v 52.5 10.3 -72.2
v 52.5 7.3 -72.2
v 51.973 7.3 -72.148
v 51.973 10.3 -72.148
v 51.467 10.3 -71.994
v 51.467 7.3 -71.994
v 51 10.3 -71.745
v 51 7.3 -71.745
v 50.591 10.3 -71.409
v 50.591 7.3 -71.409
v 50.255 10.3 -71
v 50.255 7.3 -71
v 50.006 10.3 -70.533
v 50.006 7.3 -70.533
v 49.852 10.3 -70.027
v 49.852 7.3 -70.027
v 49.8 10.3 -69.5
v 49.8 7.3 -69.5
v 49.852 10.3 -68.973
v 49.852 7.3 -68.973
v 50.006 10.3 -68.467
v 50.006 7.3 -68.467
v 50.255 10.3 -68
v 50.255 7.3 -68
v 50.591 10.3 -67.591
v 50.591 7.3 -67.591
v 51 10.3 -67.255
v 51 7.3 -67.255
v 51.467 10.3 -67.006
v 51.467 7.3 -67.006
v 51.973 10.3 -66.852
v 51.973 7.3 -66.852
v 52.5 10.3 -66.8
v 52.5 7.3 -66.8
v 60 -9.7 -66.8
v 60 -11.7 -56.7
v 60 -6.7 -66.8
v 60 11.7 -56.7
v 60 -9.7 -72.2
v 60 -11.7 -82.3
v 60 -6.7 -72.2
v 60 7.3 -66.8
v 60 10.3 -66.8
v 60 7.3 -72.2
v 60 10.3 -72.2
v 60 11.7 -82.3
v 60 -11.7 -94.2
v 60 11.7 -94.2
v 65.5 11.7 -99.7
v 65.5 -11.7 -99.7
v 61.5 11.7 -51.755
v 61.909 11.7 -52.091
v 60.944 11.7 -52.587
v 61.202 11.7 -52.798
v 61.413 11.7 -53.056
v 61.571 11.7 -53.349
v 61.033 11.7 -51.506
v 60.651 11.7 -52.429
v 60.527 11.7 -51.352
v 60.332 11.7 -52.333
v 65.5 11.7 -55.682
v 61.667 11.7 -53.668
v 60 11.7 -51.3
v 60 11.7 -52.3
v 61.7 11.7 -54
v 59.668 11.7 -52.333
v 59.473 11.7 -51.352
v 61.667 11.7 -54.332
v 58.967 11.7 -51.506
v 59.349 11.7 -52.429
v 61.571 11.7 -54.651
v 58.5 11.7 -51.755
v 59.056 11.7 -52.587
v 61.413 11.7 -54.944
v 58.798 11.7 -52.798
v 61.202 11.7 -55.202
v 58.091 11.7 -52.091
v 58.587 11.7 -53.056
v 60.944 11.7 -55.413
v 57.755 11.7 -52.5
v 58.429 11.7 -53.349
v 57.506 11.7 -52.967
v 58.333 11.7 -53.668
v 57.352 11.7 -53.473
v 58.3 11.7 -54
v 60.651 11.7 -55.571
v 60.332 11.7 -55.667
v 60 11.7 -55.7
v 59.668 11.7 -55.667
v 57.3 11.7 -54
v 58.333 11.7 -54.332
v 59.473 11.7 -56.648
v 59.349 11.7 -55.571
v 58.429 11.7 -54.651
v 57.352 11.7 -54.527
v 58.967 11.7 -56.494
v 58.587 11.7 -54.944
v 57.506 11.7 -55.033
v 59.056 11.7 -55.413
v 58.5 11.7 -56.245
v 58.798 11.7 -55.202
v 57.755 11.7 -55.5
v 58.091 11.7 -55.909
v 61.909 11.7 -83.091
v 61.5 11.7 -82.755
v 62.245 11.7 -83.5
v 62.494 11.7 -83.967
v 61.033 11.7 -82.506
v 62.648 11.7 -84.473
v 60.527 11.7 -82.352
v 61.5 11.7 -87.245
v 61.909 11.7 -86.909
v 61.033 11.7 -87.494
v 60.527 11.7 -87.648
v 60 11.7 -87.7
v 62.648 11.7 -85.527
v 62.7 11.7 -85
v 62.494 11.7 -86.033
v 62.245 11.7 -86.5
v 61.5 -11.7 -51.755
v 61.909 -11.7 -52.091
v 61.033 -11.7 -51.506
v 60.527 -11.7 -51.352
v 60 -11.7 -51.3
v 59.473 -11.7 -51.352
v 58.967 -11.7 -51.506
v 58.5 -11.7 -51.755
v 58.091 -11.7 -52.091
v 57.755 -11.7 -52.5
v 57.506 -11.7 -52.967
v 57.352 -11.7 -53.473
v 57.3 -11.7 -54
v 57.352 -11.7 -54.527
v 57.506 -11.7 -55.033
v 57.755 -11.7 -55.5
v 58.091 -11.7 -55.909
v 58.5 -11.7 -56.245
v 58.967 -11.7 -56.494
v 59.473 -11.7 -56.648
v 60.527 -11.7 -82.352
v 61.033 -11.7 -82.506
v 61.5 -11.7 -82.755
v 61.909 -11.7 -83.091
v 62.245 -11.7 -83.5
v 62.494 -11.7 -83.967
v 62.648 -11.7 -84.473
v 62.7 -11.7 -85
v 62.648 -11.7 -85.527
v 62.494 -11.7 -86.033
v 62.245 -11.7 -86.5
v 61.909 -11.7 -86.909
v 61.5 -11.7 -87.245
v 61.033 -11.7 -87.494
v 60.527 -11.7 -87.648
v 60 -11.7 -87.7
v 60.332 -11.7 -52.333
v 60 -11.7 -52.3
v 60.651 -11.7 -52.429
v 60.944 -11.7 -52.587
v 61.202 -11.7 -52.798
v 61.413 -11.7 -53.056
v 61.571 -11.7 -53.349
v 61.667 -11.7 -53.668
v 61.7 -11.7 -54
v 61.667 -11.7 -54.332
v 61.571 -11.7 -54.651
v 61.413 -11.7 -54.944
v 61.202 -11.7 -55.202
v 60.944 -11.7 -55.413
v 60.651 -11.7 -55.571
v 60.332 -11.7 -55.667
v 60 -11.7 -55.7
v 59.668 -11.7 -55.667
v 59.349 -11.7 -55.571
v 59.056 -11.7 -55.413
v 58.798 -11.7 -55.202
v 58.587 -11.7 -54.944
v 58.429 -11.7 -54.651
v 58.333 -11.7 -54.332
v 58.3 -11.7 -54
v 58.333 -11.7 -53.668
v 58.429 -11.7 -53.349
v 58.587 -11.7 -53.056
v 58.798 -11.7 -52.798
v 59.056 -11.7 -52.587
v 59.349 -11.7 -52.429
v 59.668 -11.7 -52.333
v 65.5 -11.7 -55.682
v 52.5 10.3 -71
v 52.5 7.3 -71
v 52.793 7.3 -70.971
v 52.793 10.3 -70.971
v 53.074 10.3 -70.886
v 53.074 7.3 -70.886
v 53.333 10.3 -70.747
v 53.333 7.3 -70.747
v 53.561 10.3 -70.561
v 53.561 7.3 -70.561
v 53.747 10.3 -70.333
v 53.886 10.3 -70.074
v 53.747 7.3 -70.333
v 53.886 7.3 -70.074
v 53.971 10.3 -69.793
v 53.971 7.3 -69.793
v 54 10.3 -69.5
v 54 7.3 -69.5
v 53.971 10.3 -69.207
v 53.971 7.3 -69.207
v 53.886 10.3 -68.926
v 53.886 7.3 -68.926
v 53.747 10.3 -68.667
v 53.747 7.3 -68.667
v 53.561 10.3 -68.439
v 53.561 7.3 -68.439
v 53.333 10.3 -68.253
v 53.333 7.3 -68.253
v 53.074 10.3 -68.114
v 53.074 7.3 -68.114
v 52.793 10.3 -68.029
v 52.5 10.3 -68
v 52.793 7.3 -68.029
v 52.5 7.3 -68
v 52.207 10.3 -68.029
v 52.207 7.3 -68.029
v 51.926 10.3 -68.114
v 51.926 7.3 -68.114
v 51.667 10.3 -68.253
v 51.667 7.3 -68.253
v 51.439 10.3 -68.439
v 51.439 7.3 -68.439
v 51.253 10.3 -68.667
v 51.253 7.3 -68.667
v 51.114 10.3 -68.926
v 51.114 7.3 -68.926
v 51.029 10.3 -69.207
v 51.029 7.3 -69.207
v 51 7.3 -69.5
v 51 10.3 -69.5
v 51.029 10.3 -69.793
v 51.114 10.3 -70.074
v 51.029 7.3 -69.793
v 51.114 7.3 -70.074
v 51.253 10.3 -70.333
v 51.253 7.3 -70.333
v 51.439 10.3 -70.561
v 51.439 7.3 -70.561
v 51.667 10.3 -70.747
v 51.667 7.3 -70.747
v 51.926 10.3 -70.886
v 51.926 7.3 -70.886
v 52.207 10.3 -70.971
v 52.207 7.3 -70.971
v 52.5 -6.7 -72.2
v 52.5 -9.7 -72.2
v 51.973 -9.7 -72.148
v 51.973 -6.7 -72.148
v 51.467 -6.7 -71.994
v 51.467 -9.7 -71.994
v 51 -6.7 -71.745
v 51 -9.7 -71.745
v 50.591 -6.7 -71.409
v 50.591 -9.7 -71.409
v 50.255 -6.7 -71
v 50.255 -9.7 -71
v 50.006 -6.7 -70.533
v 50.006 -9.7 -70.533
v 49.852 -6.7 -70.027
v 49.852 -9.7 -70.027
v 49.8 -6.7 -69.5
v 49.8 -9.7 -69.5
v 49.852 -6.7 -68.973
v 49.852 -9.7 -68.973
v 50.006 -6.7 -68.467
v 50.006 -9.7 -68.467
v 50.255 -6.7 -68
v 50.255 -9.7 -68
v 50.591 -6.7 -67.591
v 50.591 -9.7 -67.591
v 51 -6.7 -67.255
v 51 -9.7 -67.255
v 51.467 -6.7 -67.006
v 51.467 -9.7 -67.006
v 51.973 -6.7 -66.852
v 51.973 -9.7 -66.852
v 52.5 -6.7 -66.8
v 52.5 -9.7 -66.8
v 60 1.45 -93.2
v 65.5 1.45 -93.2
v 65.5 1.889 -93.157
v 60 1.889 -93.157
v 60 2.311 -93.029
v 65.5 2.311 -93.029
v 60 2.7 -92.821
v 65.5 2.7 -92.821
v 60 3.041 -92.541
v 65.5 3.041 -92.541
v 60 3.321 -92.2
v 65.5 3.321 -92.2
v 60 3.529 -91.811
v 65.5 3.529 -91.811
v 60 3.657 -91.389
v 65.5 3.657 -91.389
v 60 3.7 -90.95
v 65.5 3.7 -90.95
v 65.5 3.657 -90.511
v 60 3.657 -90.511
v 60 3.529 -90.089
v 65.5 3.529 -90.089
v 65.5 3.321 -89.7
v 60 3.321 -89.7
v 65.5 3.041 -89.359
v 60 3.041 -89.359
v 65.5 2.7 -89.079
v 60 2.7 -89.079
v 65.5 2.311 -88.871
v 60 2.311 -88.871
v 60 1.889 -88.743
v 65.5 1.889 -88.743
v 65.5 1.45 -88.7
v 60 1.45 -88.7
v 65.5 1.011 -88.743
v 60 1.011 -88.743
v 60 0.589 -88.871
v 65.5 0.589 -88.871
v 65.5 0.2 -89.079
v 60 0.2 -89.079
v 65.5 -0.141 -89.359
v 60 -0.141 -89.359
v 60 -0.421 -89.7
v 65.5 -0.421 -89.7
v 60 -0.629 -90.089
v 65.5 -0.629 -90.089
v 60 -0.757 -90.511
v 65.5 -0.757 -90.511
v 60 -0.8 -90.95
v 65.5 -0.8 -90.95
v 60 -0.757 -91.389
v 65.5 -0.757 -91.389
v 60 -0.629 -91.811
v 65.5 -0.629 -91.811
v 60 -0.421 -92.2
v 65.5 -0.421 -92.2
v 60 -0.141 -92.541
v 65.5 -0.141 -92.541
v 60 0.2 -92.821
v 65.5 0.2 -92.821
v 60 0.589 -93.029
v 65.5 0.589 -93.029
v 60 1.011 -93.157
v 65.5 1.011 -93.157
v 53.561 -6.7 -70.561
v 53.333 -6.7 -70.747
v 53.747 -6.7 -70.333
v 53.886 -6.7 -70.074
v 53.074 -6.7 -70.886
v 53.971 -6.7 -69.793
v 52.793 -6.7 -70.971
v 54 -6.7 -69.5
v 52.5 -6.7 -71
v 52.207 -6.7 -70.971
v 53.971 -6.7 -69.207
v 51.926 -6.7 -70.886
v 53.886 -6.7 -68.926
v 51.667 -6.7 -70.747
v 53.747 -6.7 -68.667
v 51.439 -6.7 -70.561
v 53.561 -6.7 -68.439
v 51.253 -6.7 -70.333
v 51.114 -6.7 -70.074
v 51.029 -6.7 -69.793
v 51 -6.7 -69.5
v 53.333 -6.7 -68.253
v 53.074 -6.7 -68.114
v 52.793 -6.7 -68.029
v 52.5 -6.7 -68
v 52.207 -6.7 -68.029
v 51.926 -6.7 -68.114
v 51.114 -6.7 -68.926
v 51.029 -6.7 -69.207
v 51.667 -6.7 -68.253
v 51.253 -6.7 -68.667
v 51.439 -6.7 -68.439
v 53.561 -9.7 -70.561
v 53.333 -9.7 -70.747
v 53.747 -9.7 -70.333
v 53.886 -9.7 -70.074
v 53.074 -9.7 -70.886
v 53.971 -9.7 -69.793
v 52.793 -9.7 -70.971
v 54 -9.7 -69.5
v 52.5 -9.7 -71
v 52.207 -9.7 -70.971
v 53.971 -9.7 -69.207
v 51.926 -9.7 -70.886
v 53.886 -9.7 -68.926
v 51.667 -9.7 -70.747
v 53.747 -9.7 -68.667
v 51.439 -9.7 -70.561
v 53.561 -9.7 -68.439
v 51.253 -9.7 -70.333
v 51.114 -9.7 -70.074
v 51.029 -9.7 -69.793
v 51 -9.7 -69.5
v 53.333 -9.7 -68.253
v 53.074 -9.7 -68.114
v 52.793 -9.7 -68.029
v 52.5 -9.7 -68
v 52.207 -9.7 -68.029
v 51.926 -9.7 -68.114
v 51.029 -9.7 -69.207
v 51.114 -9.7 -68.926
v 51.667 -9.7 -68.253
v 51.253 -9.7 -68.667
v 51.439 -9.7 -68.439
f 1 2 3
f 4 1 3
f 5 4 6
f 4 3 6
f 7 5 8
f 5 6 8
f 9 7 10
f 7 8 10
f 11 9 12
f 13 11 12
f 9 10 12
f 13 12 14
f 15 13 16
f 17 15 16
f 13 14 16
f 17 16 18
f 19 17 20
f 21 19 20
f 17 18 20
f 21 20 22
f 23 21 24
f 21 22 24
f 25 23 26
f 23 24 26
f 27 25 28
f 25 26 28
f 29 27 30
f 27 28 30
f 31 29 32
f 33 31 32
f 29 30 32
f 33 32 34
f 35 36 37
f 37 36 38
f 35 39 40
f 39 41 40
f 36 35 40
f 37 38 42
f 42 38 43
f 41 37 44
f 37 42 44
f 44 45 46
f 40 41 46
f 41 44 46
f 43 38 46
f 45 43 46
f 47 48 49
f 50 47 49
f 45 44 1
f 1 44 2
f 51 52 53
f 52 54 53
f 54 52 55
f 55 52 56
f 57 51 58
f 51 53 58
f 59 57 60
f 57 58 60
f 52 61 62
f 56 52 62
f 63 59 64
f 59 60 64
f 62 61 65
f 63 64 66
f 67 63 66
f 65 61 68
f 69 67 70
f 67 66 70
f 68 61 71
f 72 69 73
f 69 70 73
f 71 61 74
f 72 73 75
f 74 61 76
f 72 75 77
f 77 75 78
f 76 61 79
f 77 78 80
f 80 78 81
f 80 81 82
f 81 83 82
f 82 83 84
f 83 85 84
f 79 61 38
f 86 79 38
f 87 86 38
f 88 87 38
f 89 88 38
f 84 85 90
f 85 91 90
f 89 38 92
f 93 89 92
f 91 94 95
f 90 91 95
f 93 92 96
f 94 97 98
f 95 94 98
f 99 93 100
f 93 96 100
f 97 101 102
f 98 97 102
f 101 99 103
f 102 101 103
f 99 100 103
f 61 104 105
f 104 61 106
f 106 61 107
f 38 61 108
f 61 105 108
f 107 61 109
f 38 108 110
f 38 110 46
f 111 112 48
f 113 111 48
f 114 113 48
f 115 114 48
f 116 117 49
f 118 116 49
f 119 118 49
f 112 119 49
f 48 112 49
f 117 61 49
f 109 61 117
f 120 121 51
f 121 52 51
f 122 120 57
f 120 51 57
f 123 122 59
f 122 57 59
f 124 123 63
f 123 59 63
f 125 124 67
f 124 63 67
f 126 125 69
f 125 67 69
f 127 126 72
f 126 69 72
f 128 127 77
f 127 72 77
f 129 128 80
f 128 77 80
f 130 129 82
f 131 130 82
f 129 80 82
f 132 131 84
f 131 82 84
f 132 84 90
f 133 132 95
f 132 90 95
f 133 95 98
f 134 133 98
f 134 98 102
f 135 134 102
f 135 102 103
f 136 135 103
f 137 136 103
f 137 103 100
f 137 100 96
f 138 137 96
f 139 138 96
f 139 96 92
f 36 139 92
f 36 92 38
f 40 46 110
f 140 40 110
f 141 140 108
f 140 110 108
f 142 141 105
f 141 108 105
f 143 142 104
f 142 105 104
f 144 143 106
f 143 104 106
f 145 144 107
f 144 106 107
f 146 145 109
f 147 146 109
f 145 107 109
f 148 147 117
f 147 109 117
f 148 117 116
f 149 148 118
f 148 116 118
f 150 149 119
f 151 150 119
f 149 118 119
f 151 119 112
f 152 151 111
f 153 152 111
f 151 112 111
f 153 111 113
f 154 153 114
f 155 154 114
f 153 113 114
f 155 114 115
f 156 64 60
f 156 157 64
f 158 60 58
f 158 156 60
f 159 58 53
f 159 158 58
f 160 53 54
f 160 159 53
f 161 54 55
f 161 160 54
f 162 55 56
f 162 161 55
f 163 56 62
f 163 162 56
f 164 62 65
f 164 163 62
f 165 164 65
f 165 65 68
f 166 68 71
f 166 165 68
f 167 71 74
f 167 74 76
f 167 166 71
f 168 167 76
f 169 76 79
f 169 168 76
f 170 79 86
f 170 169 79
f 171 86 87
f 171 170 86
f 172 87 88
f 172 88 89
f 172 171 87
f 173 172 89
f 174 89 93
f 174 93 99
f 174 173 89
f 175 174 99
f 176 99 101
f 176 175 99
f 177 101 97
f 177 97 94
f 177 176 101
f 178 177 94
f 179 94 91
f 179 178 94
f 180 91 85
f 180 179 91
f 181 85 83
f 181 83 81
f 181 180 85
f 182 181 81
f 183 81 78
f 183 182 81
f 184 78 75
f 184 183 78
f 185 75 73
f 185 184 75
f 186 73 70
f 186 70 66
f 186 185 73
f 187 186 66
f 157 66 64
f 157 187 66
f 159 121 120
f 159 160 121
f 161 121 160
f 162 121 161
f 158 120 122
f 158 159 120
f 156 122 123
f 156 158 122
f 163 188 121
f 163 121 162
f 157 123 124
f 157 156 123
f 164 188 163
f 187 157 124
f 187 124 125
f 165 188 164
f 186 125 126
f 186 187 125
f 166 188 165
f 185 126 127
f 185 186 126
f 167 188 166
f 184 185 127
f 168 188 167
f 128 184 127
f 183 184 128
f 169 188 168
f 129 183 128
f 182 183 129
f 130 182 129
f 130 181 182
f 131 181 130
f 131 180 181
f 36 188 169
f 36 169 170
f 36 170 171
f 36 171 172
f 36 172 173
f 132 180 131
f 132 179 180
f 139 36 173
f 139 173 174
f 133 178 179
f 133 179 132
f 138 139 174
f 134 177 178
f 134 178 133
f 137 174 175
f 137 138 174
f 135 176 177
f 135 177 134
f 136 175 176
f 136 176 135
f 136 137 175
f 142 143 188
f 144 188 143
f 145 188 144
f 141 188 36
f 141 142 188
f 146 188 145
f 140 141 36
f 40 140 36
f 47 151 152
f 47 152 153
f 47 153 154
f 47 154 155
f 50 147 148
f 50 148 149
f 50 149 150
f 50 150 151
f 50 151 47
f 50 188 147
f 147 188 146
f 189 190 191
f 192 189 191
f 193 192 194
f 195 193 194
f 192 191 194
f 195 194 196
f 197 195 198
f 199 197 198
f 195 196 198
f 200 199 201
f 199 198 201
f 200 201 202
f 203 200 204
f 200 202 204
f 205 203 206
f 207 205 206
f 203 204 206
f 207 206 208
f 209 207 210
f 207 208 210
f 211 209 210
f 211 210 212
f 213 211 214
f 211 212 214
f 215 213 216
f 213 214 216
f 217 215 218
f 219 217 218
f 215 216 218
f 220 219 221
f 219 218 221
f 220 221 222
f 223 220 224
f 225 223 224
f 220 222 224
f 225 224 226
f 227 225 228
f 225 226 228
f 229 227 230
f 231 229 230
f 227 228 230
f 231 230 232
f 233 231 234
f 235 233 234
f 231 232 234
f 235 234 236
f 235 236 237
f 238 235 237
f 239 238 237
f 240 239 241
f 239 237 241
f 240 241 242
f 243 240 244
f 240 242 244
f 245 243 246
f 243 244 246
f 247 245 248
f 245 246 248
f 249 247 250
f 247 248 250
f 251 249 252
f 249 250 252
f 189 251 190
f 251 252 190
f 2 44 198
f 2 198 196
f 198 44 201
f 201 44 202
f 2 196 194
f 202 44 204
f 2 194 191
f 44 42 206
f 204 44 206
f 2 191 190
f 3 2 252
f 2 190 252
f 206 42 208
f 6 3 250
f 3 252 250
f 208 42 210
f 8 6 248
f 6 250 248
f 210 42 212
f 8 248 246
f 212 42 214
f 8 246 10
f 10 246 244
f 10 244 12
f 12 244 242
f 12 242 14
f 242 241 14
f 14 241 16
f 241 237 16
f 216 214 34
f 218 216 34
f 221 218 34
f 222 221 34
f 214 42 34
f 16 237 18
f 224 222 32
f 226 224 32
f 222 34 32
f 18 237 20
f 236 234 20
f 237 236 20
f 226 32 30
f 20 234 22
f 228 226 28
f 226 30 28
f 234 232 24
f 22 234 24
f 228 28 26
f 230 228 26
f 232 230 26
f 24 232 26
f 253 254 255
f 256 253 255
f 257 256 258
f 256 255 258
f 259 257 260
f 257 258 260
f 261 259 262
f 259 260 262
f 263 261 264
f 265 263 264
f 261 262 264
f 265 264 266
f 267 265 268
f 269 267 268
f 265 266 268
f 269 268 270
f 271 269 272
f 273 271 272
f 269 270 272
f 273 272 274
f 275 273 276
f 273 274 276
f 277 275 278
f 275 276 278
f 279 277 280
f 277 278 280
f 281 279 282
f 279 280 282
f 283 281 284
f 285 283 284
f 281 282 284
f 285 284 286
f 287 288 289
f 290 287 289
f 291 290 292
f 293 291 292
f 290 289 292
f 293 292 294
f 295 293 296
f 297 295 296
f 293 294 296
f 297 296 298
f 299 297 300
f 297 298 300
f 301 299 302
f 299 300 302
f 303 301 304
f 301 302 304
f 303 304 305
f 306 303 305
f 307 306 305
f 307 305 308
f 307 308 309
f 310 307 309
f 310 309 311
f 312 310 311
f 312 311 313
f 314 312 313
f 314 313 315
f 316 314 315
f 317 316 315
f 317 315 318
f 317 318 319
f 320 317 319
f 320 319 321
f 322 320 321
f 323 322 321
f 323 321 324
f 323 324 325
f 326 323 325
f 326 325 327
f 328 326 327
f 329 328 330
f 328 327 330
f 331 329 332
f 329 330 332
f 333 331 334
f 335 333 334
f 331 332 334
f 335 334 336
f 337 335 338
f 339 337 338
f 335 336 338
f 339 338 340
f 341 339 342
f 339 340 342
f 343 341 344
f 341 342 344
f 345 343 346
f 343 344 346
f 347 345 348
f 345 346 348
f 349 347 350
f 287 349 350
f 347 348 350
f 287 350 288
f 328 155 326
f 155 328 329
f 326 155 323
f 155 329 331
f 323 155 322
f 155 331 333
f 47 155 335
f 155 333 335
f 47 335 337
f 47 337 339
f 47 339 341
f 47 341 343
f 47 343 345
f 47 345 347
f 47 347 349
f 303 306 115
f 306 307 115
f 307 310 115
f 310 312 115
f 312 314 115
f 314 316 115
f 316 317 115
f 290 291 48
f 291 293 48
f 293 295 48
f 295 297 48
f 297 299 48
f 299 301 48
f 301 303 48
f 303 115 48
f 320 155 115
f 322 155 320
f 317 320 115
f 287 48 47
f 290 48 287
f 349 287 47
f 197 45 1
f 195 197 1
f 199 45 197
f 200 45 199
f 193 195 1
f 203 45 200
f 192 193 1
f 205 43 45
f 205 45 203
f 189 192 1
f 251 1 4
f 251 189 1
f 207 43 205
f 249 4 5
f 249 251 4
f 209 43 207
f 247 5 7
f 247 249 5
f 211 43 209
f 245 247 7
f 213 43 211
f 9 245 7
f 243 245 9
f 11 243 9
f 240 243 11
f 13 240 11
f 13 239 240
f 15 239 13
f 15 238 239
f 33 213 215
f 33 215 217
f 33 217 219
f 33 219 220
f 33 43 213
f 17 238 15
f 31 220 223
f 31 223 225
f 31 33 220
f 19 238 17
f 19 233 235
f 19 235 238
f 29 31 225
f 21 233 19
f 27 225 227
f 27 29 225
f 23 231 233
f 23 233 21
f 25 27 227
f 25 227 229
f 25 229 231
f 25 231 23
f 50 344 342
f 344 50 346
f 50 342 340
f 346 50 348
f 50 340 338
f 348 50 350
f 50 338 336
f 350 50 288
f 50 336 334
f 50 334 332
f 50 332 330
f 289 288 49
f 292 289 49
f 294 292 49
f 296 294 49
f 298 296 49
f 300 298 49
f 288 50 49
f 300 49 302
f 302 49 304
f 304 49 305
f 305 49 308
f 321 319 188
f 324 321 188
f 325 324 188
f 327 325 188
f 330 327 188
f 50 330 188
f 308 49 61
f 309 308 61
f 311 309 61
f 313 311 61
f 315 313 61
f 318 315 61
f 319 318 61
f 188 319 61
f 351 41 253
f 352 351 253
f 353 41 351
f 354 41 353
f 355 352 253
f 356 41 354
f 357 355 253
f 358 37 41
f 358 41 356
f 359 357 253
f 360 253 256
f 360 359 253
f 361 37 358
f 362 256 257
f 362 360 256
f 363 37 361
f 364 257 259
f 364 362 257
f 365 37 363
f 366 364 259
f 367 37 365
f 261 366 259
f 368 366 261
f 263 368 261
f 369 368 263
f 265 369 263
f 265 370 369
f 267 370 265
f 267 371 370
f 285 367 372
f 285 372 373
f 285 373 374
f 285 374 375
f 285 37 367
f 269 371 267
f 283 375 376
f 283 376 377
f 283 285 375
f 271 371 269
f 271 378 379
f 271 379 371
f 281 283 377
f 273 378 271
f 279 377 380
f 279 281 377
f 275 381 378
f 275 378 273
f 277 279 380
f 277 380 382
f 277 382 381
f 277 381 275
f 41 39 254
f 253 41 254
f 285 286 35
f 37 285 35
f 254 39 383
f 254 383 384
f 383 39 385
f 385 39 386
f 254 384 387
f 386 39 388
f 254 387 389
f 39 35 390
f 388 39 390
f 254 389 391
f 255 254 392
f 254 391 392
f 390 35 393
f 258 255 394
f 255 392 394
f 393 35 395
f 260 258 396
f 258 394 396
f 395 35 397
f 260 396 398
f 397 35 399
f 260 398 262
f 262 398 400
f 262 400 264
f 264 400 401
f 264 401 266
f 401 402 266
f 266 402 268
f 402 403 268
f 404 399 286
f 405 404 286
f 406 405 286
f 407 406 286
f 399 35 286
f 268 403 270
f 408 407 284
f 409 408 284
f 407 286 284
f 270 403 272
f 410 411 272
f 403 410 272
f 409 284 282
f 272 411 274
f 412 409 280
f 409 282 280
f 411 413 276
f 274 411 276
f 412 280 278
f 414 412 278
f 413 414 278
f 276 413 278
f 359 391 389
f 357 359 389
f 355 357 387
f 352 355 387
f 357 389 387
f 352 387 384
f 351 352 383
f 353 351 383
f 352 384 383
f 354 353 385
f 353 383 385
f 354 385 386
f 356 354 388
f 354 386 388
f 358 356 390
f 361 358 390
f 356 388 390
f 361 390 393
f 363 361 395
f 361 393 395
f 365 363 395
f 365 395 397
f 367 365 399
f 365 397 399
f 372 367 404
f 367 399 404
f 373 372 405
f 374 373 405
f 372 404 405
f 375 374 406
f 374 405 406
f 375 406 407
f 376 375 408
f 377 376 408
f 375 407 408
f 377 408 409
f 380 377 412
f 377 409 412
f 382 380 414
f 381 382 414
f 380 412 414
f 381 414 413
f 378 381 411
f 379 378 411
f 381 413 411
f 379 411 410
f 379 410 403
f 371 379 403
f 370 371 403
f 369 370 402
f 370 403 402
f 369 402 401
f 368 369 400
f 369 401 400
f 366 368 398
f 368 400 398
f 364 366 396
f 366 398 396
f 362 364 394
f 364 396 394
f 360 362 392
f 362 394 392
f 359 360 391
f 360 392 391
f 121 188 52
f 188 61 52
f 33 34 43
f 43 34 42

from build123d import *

# Parameters (mm, degrees)
SKETCH1_R           = 1.7
BOSS_EXTRUDE1_DEPTH = 11.7
SKETCH2_R           = 2.25
CUT_EXTRUDE1_DEPTH  = 101.718518655
BOSS_EXTRUDE2_START = -2
SKETCH3_R           = 1.5
BOSS_EXTRUDE2_DEPTH = 3
BOSS_EXTRUDE3_START = -19
SKETCH3_2_R         = 1.5
BOSS_EXTRUDE3_DEPTH = 3


with BuildPart() as part:
    # Sketch1 → Boss-Extrude1 (new, symmetric)
    with BuildSketch(Plane(origin=(0, 0, 0), x_dir=(1, 0, 0), z_dir=(0, 1, 0))):
        with BuildLine():
            Line((60, 94.2), (65.5, 99.7))
            Line((65.5, 99.7), (65.5, 55.681623382))
            Line((65.5, 55.681623382), (61.909188309, 52.090811691))
            ThreePointArc((61.909188309, 52.090811691), (57.505525262, 52.966754733), (60, 56.7))
            Line((60, 56.7), (60, 82.3))
            ThreePointArc((60, 82.3), (62.7, 85), (60, 87.7))
            Line((60, 87.7), (60, 88.7))
            Line((60, 88.7), (60, 93.2))
            Line((60, 93.2), (60, 94.2))
        make_face()
        with Locations((60, 54)):
            Circle(SKETCH1_R, mode=Mode.SUBTRACT)
    extrude(amount=BOSS_EXTRUDE1_DEPTH, both=True)

    # Sketch2 → Cut-Extrude1 (cut, through all)
    with BuildSketch(Plane(origin=(65.5, 0, 0), x_dir=(0, 0, -1), z_dir=(1, 0, 0))):
        with Locations((90.95, 1.45)):
            Circle(SKETCH2_R)
    extrude(amount=-CUT_EXTRUDE1_DEPTH, mode=Mode.SUBTRACT)

    # Sketch3 → Boss-Extrude2 (add)
    with BuildSketch(Plane.XZ.offset(11.7).offset(BOSS_EXTRUDE2_START)):
        with BuildLine():
            Line((52.5, -66.8), (60, -66.8))
            Line((60, -66.8), (60, -72.2))
            Line((60, -72.2), (52.5, -72.2))
            ThreePointArc((52.5, -72.2), (49.8, -69.5), (52.5, -66.8))
        make_face()
        with Locations((52.5, -69.5)):
            Circle(SKETCH3_R, mode=Mode.SUBTRACT)
    extrude(amount=-BOSS_EXTRUDE2_DEPTH)

    # Sketch3<2> → Boss-Extrude3 (add)
    with BuildSketch(Plane.XZ.offset(11.7).offset(BOSS_EXTRUDE3_START)):
        with BuildLine():
            Line((52.5, -66.8), (60, -66.8))
            Line((60, -66.8), (60, -72.2))
            Line((60, -72.2), (52.5, -72.2))
            ThreePointArc((52.5, -72.2), (49.8, -69.5), (52.5, -66.8))
        make_face()
        with Locations((52.5, -69.5)):
            Circle(SKETCH3_2_R, mode=Mode.SUBTRACT)
    extrude(amount=-BOSS_EXTRUDE3_DEPTH)


solid = part.part
